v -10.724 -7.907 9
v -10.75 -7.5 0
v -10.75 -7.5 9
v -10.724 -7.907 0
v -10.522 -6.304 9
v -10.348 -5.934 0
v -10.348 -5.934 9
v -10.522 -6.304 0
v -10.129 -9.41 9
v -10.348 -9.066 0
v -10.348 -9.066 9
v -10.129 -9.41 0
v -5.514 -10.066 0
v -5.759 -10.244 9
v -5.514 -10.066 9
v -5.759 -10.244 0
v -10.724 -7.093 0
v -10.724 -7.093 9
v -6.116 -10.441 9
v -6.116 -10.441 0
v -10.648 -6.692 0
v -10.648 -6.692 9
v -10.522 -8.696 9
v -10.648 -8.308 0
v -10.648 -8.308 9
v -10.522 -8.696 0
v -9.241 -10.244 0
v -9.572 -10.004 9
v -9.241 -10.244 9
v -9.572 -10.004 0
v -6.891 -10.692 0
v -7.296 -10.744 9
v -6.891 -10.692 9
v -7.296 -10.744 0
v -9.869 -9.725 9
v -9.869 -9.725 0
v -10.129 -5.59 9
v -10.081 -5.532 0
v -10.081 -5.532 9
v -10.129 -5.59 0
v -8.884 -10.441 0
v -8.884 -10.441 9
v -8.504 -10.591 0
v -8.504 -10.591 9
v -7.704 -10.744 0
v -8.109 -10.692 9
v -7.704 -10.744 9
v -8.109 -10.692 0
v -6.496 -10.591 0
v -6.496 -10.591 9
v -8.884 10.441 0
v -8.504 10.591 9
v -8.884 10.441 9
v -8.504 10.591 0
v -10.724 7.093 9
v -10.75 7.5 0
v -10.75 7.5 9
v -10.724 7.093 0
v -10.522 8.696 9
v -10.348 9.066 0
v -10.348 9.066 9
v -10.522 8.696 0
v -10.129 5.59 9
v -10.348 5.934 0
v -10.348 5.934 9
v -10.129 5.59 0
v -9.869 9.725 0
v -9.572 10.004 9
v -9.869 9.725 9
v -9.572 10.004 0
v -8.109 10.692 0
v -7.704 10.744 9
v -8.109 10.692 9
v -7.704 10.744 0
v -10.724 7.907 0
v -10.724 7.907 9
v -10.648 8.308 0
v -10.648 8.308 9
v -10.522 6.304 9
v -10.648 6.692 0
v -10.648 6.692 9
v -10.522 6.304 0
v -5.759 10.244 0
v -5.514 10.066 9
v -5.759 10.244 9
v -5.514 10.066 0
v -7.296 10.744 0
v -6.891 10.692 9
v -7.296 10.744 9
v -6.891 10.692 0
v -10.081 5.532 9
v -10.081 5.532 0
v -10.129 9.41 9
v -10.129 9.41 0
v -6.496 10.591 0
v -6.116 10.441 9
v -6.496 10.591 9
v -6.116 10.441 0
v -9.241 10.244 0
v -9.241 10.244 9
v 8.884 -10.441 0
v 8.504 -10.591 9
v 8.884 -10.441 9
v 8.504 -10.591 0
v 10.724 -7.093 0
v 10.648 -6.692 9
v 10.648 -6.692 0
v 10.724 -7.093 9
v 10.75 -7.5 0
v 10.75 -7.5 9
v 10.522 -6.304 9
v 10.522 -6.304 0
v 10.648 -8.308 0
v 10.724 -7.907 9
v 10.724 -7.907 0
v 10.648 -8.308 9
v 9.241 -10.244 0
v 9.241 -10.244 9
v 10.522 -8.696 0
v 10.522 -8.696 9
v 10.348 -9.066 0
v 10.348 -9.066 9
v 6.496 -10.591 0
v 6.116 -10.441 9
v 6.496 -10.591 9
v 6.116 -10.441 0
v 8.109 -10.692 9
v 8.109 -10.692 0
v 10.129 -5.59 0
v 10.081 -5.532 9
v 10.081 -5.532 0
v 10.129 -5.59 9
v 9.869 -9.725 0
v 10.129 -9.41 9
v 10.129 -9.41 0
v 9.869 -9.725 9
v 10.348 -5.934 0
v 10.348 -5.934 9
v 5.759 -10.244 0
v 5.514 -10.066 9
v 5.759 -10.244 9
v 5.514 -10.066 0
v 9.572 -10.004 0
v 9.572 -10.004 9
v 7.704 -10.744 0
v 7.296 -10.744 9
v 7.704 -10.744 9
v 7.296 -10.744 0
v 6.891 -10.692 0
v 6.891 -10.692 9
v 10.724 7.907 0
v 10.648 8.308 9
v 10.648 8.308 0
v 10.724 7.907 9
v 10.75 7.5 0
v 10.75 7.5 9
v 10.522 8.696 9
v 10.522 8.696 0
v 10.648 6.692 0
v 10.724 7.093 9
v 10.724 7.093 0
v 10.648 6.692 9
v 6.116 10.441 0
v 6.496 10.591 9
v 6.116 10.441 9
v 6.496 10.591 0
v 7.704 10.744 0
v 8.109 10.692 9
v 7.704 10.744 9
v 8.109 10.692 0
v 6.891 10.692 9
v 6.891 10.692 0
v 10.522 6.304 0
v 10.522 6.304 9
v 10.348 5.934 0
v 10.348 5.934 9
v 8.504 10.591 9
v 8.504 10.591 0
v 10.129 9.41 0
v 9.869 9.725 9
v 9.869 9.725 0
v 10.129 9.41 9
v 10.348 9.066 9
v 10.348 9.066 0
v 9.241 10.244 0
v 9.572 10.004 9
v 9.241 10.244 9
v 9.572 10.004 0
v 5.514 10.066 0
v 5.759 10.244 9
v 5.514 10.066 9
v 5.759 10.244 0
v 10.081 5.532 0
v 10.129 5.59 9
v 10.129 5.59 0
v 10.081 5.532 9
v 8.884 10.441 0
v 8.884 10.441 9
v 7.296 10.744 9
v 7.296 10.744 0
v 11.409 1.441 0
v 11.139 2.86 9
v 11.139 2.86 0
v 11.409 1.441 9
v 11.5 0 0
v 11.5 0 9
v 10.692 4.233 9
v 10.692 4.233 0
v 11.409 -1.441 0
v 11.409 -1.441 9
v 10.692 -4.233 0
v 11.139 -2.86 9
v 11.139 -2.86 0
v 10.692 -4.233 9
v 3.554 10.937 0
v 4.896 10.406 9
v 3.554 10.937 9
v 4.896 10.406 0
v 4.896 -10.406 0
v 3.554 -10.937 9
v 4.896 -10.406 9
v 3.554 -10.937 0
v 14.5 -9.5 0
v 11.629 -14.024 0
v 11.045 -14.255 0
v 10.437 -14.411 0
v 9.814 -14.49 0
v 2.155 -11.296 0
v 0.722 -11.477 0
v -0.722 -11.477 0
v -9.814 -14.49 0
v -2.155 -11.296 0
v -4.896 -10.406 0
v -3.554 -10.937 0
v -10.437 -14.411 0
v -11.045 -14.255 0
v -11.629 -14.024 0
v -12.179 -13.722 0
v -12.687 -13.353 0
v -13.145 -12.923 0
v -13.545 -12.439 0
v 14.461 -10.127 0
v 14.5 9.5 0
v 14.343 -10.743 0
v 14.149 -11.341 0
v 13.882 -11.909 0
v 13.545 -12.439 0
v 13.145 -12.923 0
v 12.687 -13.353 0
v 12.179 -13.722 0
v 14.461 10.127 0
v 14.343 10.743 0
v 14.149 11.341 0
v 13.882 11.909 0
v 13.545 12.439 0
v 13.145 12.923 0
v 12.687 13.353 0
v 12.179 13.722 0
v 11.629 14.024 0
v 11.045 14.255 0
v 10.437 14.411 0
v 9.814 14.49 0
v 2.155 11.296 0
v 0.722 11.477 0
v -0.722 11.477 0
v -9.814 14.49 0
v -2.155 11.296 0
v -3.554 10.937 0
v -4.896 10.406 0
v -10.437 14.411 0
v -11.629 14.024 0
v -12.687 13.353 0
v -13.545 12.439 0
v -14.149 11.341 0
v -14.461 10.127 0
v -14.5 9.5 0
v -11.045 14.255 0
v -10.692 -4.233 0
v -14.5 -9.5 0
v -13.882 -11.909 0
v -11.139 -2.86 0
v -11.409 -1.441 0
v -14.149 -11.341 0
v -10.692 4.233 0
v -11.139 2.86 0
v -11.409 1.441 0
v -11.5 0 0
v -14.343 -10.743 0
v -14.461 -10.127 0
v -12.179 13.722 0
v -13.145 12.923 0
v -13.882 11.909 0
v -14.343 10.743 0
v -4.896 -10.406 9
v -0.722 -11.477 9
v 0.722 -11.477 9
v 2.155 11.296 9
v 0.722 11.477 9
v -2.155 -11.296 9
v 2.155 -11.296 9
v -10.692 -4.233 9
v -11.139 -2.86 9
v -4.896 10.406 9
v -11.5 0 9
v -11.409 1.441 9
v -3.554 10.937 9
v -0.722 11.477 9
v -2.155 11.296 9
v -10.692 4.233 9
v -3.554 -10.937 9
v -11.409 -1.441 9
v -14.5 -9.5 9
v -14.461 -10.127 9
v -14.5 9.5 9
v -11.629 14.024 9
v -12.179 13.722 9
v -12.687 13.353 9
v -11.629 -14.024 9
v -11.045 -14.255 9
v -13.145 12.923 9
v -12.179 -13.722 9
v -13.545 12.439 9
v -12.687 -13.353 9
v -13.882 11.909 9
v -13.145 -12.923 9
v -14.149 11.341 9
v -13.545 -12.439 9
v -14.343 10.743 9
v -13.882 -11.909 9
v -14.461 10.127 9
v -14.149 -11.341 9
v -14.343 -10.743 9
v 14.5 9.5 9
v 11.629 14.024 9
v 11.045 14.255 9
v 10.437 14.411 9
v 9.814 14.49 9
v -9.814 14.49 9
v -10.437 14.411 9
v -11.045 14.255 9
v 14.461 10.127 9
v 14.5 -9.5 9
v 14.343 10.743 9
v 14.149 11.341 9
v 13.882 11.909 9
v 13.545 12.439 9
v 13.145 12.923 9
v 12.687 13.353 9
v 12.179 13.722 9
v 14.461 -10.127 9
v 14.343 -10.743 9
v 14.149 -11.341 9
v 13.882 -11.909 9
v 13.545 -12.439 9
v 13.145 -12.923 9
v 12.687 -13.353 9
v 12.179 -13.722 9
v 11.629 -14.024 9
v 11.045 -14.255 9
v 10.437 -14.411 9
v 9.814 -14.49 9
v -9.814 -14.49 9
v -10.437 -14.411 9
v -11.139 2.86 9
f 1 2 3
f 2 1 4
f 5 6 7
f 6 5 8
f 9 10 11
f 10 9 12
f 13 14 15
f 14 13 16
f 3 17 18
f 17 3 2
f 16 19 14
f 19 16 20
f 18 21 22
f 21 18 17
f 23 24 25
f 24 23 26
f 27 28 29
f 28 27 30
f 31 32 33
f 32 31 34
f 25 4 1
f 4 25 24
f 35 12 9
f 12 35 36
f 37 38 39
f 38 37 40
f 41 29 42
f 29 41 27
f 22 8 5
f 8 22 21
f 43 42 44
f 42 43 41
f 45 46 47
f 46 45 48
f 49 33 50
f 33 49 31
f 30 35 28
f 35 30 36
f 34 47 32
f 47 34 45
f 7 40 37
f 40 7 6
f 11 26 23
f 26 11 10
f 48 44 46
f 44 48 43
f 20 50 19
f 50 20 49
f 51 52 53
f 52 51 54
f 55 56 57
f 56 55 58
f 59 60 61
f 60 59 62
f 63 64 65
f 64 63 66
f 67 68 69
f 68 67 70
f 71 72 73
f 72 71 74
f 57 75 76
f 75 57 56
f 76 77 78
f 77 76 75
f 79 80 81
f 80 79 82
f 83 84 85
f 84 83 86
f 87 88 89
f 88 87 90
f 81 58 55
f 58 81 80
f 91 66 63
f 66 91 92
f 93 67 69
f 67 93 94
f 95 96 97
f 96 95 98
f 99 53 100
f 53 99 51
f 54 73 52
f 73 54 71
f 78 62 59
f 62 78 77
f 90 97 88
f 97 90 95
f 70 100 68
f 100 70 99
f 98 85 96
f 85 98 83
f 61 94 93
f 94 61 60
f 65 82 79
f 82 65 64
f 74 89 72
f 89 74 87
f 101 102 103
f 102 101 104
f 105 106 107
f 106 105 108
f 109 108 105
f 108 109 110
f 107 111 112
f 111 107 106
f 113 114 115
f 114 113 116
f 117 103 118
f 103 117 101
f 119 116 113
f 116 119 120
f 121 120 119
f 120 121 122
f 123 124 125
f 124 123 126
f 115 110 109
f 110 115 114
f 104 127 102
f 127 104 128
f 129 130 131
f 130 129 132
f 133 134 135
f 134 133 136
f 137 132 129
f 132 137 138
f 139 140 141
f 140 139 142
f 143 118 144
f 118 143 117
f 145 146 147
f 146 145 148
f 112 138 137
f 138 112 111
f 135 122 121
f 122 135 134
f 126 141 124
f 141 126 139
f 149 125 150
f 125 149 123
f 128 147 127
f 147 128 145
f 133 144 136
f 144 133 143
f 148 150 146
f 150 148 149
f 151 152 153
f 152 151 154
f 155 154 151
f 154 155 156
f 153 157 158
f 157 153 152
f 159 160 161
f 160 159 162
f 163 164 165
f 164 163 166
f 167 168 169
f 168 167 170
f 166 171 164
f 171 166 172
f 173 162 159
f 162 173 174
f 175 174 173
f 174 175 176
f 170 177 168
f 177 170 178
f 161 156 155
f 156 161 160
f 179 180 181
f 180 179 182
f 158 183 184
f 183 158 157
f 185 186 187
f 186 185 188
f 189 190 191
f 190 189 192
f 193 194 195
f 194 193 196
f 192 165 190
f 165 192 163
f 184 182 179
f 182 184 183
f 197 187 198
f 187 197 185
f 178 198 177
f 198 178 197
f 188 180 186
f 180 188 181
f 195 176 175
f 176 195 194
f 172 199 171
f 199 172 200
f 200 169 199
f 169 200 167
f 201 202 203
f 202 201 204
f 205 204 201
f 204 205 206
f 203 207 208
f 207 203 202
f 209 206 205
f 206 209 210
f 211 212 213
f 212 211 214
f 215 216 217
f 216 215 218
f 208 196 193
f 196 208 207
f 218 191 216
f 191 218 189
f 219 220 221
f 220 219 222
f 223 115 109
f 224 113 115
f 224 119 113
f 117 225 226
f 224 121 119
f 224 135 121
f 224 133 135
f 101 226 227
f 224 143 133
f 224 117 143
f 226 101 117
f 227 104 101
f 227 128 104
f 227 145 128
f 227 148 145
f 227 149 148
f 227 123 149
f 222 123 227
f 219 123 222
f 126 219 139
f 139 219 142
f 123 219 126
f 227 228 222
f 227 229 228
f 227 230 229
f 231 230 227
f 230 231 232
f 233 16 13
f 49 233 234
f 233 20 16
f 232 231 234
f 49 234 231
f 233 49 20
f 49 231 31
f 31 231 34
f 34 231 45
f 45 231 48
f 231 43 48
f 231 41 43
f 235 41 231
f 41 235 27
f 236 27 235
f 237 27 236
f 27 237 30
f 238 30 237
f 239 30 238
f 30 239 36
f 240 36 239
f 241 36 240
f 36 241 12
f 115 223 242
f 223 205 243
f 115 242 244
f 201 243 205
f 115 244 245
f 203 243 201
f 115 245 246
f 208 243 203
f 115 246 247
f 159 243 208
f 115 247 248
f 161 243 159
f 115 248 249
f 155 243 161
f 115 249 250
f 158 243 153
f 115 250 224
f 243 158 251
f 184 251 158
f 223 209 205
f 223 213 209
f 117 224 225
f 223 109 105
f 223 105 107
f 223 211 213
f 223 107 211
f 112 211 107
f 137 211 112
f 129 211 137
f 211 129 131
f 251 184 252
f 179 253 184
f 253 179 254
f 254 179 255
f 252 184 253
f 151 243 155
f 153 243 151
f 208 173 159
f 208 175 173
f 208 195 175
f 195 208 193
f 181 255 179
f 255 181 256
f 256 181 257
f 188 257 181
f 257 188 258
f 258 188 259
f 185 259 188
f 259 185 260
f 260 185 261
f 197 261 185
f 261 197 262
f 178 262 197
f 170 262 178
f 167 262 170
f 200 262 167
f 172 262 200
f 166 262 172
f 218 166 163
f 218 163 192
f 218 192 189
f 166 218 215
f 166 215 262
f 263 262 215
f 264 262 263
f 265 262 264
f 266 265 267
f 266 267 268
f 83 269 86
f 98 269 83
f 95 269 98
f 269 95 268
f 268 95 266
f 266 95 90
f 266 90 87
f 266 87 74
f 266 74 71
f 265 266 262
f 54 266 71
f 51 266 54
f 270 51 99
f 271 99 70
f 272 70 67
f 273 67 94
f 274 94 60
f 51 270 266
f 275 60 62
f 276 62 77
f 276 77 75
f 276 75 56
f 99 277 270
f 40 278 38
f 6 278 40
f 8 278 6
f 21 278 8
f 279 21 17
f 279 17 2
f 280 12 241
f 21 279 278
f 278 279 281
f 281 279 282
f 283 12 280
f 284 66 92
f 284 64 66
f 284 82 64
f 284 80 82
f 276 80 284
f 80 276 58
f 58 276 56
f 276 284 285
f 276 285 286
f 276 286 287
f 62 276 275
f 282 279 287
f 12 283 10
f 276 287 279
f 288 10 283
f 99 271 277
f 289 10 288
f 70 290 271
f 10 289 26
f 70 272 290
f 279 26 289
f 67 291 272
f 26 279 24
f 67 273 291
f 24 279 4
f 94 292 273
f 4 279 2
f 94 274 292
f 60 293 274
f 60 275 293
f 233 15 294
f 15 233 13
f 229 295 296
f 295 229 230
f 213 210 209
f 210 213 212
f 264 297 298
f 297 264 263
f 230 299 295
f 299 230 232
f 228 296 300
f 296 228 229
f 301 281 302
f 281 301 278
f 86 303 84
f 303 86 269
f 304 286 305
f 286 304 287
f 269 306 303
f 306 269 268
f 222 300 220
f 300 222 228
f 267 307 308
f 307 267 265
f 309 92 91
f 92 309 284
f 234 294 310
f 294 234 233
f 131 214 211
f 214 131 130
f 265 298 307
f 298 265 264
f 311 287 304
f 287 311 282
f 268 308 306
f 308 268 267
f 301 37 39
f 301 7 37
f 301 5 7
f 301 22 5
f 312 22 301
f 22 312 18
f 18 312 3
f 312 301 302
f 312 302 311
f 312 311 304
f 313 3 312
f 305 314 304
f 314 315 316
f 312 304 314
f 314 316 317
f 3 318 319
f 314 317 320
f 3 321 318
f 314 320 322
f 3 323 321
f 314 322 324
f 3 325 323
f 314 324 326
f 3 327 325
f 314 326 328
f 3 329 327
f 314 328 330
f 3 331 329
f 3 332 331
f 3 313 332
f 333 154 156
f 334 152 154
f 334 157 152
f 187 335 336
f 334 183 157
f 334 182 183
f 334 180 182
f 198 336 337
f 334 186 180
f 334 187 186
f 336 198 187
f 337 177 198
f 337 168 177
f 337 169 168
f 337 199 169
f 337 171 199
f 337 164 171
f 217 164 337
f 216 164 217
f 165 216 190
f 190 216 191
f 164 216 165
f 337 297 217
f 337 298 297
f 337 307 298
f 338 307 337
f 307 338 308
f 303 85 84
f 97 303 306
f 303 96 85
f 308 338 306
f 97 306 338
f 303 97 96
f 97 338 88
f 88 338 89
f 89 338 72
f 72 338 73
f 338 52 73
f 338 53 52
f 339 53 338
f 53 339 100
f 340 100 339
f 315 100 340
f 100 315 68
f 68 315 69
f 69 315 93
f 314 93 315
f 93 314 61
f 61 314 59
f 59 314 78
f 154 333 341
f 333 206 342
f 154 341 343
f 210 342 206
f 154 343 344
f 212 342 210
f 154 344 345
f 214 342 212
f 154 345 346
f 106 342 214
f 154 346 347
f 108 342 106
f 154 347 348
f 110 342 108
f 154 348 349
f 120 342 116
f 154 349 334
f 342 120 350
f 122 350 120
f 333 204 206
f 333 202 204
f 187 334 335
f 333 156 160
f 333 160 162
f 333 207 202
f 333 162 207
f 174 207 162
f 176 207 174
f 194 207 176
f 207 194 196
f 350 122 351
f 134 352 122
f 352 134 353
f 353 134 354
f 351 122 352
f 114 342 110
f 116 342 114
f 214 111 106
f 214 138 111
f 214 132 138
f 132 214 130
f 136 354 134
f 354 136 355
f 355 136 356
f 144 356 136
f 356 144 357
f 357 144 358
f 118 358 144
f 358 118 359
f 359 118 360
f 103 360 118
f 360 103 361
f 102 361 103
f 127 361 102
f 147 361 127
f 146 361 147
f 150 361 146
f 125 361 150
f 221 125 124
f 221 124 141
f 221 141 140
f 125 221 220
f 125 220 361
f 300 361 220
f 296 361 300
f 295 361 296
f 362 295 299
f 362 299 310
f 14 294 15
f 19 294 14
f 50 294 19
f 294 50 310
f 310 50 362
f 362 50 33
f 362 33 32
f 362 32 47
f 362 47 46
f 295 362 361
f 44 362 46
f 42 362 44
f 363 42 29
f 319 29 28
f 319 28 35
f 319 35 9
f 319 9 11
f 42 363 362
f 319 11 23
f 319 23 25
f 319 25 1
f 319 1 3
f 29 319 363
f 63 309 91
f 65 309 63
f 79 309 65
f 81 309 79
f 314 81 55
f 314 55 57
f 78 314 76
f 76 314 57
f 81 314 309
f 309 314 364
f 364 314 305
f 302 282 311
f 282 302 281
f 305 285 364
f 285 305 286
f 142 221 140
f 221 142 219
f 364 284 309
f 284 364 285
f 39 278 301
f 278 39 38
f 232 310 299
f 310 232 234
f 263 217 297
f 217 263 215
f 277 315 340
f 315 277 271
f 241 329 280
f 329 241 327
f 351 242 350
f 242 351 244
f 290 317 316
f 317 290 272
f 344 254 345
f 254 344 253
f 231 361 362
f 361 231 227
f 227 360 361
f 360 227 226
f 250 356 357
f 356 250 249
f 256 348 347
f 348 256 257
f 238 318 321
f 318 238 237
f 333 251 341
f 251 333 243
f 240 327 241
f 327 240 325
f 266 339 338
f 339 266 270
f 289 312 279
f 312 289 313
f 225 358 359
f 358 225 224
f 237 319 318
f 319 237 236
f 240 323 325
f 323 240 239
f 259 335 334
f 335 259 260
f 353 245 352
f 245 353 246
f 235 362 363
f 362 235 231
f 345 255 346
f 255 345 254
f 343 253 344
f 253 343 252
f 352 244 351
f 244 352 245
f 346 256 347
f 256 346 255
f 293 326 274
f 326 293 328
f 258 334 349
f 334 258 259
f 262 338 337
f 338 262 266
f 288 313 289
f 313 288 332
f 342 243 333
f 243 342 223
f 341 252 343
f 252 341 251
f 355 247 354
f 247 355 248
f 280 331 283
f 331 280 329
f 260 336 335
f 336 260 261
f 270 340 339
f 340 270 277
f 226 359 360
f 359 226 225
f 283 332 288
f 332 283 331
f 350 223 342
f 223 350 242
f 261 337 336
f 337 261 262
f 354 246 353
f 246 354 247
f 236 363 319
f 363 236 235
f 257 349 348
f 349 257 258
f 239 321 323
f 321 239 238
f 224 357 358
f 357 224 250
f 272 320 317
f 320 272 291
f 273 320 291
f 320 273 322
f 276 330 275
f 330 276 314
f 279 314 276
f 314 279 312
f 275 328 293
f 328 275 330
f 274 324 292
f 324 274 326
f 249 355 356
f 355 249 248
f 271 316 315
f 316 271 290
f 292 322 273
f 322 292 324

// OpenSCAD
$fn = 50;

difference() {
	union() {
		hull() {
			translate(v = [-9.5, 9.5, 0]) {
				cylinder(h = 9, r = 5);
			}
			translate(v = [9.5, 9.5, 0]) {
				cylinder(h = 9, r = 5);
			}
			translate(v = [-9.5, -9.5, 0]) {
				cylinder(h = 9, r = 5);
			}
			translate(v = [9.5, -9.5, 0]) {
				cylinder(h = 9, r = 5);
			}
		}
	}
	union() {
		translate(v = [-7.5, -7.5, -100.0]) {
			cylinder(h = 200, r = 3.25);
		}
		translate(v = [-7.5, 7.5, -100.0]) {
			cylinder(h = 200, r = 3.25);
		}
		translate(v = [7.5, -7.5, -100.0]) {
			cylinder(h = 200, r = 3.25);
		}
		translate(v = [7.5, 7.5, -100.0]) {
			cylinder(h = 200, r = 3.25);
		}
		translate(v = [-7.5, -7.5, -100.0]) {
			cylinder(h = 200, r = 1.8);
		}
		translate(v = [-7.5, 7.5, -100.0]) {
			cylinder(h = 200, r = 1.8);
		}
		translate(v = [7.5, -7.5, -100.0]) {
			cylinder(h = 200, r = 1.8);
		}
		translate(v = [7.5, 7.5, -100.0]) {
			cylinder(h = 200, r = 1.8);
		}
		cylinder(h = 9, r = 11.5);
	}
}
